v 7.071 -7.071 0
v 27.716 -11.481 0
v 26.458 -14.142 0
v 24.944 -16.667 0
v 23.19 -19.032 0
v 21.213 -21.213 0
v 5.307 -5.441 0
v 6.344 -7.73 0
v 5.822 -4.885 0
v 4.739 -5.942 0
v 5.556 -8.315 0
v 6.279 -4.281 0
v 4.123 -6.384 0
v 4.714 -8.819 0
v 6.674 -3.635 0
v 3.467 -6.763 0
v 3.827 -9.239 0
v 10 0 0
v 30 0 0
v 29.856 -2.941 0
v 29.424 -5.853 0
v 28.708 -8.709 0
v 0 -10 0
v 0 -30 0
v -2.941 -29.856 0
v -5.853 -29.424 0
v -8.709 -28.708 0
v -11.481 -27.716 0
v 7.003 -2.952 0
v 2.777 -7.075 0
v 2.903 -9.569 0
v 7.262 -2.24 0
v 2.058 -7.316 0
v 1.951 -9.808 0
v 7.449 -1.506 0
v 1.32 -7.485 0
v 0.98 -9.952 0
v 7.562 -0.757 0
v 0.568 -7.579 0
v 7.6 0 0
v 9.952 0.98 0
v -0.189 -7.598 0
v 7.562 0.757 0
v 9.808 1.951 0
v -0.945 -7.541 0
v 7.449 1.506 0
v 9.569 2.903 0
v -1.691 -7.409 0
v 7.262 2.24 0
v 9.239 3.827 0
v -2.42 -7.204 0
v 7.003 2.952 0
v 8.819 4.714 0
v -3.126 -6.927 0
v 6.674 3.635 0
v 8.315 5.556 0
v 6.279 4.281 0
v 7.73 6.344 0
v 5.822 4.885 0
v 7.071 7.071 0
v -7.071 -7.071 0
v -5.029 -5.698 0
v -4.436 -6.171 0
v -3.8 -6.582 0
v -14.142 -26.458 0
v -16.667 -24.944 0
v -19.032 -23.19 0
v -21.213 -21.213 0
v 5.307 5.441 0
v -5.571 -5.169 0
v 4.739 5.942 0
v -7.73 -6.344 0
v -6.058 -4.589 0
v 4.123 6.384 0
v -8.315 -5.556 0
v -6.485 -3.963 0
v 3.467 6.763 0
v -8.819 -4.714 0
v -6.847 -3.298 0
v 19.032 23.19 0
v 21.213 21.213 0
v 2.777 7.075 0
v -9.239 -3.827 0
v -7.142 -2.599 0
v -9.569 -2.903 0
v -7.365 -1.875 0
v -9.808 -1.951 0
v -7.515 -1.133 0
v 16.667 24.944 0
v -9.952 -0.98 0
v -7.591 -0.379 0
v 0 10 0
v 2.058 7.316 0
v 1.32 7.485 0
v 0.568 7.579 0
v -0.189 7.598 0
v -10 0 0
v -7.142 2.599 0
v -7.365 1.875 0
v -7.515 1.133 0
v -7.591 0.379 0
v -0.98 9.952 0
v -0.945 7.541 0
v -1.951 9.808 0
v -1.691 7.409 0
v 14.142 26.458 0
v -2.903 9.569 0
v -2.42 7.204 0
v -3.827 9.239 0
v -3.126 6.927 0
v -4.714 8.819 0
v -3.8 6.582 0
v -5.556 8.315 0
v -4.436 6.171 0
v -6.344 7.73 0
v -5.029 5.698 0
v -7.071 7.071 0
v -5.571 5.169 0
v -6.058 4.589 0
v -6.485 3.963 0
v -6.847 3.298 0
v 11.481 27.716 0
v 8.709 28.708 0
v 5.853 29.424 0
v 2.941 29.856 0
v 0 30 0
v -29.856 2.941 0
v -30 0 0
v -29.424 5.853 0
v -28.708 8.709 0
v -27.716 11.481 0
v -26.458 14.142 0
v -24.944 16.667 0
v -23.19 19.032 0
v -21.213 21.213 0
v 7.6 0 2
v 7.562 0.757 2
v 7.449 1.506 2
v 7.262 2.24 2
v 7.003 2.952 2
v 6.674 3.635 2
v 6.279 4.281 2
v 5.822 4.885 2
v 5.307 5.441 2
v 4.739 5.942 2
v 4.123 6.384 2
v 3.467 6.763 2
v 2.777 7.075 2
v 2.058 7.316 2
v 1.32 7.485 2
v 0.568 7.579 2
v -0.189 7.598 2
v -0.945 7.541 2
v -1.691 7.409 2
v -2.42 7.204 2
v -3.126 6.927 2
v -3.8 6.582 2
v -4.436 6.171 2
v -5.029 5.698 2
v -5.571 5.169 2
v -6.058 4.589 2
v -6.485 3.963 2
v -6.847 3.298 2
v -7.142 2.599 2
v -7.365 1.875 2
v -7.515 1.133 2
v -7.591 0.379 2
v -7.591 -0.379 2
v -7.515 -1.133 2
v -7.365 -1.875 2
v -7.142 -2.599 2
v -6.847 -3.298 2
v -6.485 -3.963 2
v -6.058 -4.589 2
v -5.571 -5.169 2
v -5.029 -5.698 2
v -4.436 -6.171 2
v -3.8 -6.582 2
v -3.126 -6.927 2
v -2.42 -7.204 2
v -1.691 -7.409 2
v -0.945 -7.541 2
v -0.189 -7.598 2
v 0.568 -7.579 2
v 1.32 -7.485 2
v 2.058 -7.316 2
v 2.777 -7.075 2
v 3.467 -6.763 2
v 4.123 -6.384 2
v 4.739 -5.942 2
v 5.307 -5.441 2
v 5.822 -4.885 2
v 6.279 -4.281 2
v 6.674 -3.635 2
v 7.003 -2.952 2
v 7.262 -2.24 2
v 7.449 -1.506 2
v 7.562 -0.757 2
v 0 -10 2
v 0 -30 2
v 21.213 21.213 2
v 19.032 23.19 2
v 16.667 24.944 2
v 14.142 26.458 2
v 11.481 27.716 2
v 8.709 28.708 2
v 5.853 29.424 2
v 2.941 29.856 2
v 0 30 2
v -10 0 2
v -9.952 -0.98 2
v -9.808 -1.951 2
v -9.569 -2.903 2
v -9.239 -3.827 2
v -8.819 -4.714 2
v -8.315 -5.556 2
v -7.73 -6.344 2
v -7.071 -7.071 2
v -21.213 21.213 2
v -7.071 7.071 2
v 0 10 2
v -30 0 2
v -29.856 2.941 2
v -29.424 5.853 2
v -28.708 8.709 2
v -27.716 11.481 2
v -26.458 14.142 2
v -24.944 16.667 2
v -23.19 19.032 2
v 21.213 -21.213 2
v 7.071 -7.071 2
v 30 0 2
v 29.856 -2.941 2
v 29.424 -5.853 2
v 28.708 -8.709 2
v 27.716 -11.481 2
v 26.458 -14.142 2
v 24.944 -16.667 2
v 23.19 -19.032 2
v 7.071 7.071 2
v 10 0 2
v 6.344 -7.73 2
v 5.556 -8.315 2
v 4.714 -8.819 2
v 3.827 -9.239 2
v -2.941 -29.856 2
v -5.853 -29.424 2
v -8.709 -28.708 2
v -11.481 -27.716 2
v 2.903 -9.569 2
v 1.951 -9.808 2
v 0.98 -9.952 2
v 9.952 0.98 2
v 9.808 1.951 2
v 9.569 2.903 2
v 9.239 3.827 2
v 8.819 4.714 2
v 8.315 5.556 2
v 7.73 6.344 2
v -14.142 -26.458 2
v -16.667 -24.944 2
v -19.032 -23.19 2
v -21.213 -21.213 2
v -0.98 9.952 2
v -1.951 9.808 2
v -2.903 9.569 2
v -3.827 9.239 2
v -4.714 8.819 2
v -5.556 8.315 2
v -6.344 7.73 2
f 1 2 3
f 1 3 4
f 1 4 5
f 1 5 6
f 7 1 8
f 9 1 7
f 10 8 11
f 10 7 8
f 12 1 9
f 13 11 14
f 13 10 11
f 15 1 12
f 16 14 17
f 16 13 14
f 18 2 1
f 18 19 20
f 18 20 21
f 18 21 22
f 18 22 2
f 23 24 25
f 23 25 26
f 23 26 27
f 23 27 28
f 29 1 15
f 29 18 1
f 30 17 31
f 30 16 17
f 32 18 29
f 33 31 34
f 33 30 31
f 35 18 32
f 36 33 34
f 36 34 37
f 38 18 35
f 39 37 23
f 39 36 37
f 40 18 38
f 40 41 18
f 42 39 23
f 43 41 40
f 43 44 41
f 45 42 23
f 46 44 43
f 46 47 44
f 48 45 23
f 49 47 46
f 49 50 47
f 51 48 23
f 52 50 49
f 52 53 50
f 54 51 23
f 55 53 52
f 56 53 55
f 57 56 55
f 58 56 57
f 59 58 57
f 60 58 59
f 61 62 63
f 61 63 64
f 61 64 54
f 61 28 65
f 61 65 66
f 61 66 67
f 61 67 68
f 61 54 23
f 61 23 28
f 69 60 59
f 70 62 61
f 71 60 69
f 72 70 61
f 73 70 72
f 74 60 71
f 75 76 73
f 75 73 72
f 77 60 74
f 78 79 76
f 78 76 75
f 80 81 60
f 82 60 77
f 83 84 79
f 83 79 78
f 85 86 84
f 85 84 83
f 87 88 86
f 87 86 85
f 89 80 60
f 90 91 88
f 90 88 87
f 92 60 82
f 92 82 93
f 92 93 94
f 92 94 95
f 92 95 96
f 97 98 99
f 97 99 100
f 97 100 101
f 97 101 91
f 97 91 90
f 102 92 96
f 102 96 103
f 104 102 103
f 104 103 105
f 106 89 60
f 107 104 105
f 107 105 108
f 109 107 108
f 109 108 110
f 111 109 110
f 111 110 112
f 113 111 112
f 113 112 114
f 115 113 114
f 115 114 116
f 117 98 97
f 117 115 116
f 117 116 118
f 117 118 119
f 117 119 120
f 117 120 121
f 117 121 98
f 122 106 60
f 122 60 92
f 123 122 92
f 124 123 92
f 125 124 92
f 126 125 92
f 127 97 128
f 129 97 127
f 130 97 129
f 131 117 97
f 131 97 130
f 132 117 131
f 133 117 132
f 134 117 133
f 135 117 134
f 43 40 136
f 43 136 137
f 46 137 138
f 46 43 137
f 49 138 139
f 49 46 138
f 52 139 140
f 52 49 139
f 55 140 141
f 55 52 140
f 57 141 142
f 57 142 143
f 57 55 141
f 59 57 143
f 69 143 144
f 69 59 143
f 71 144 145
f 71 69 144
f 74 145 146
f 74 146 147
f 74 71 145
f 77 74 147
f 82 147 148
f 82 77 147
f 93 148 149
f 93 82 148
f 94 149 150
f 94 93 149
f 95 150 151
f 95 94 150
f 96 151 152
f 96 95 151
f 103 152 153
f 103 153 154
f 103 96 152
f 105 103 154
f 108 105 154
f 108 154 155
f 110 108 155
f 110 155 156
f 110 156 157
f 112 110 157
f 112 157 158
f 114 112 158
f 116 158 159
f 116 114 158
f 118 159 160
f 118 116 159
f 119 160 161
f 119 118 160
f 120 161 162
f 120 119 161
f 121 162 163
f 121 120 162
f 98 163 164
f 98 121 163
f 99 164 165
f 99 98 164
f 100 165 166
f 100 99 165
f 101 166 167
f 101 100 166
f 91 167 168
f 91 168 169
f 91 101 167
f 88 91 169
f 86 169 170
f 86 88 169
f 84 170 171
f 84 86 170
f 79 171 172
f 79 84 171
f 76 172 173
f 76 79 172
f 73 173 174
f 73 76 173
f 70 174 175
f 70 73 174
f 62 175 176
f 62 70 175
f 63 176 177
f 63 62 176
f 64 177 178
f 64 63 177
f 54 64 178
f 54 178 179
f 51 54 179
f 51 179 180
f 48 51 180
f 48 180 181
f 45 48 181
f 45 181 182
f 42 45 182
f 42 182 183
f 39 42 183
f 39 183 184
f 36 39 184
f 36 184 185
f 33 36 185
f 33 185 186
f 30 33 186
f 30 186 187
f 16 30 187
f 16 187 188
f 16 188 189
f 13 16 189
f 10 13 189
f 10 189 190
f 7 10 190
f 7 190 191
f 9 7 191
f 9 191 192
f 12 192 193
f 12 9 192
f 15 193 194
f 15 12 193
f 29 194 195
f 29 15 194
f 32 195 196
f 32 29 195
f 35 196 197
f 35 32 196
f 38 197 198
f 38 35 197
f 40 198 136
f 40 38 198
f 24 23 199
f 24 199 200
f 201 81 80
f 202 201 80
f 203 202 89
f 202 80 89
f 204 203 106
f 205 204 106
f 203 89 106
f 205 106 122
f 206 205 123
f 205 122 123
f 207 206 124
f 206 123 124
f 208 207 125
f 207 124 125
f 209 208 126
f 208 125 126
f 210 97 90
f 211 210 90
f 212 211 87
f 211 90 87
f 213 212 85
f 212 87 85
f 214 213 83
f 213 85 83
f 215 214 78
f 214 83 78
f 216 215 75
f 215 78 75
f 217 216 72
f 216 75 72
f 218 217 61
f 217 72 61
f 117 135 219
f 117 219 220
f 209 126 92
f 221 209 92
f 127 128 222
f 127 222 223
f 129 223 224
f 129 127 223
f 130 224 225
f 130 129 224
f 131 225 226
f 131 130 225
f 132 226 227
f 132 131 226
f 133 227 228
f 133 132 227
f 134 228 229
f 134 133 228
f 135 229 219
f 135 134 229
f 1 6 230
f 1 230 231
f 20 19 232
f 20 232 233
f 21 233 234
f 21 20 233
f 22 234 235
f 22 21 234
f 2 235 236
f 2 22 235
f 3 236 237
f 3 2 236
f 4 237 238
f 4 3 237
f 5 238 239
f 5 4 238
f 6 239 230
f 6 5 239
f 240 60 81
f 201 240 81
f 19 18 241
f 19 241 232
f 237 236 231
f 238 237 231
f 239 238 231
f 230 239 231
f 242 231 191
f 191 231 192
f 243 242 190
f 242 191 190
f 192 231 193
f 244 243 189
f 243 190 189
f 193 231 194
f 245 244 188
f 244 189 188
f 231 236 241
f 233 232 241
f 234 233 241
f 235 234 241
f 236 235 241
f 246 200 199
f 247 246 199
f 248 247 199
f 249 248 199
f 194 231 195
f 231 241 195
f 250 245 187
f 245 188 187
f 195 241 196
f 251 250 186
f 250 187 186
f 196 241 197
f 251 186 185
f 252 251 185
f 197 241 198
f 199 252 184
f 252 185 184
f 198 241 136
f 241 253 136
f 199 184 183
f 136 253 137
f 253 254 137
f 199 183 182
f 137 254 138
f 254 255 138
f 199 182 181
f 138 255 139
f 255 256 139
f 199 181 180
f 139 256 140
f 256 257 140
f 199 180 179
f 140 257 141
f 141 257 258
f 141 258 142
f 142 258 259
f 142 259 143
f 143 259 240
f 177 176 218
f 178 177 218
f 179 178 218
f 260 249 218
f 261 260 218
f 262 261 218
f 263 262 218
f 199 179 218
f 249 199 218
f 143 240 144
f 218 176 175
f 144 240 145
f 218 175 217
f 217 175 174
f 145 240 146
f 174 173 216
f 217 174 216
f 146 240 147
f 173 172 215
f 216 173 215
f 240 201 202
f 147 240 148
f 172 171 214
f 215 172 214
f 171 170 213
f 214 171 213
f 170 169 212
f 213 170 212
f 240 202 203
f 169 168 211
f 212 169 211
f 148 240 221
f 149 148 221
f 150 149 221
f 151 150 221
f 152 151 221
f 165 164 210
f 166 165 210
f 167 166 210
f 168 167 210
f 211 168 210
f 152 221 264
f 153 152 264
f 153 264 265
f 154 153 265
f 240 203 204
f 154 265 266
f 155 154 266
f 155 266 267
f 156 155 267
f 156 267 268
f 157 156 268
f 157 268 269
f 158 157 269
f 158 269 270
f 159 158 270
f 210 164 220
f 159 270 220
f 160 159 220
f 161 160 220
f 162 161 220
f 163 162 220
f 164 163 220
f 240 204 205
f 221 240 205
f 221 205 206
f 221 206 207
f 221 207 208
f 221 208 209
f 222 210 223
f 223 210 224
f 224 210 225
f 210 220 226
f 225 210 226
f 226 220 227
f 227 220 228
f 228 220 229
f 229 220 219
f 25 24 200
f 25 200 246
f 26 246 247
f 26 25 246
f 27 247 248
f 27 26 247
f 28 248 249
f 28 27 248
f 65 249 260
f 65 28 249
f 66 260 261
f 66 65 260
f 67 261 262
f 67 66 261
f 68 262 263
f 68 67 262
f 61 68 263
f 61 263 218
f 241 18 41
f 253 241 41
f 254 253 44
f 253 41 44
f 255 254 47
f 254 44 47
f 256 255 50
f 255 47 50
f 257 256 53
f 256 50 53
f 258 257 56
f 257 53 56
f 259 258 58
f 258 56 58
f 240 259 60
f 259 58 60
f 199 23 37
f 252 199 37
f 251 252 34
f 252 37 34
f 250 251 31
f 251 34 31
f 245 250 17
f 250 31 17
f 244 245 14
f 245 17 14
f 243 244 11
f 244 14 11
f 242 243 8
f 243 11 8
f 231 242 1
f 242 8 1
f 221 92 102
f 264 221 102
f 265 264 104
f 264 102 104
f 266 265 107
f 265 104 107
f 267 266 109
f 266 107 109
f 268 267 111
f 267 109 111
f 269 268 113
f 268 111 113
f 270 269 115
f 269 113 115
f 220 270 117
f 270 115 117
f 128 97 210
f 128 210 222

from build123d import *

# Parameters (mm, degrees)
SKETCH_1_R      = 10
SKETCH_1_R_2    = 7.6
EXTRUDE_1_DEPTH = 2
EXTRUDE_START   = -2
EXTRUDE_2_DEPTH = 2


with BuildPart() as part:
    # ｽｹｯﾁ1 → ﾎﾞｽ - 押し出し1 (new body)
    with BuildSketch(Plane.XY):
        Circle(SKETCH_1_R)
        Circle(SKETCH_1_R_2, mode=Mode.SUBTRACT)
    extrude(amount=EXTRUDE_1_DEPTH)

    # ｽｹｯﾁ2 → ﾎﾞｽ - 押し出し2 (add)
    with BuildSketch(Plane.XY.offset(2).offset(EXTRUDE_START)):
        with BuildLine():
            Line((0, 30), (0, 10))
            ThreePointArc((0, 10), (3.826834324, 9.238795325), (7.071067812, 7.071067812))
            Line((7.071067812, 7.071067812), (21.213203436, 21.213203436))
            ThreePointArc((21.213203436, 21.213203436), (11.480502971, 27.716385975), (0, 30))
        make_face()
        with BuildLine():
            Line((21.213203436, -21.213203436), (7.071067812, -7.071067812))
            ThreePointArc((7.071067812, -7.071067812), (9.238795325, -3.826834324), (10, 0))
            Line((10, 0), (30, 0))
            ThreePointArc((30, 0), (27.716385975, -11.480502971), (21.213203436, -21.213203436))
        make_face()
        with BuildLine():
            Line((-21.213203436, -21.213203436), (-7.071067812, -7.071067812))
            ThreePointArc((-7.071067812, -7.071067812), (-3.826834324, -9.238795325), (0, -10))
            Line((0, -10), (0, -30))
            ThreePointArc((0, -30), (-11.480502971, -27.716385975), (-21.213203436, -21.213203436))
        make_face()
        with BuildLine():
            Line((-21.213203436, 21.213203436), (-7.071067812, 7.071067812))
            ThreePointArc((-7.071067812, 7.071067812), (-9.238795325, 3.826834324), (-10, 0))
            Line((-10, 0), (-30, 0))
            ThreePointArc((-30, 0), (-27.716385975, 11.480502971), (-21.213203436, 21.213203436))
        make_face()
    extrude(amount=EXTRUDE_2_DEPTH)


solid = part.part
